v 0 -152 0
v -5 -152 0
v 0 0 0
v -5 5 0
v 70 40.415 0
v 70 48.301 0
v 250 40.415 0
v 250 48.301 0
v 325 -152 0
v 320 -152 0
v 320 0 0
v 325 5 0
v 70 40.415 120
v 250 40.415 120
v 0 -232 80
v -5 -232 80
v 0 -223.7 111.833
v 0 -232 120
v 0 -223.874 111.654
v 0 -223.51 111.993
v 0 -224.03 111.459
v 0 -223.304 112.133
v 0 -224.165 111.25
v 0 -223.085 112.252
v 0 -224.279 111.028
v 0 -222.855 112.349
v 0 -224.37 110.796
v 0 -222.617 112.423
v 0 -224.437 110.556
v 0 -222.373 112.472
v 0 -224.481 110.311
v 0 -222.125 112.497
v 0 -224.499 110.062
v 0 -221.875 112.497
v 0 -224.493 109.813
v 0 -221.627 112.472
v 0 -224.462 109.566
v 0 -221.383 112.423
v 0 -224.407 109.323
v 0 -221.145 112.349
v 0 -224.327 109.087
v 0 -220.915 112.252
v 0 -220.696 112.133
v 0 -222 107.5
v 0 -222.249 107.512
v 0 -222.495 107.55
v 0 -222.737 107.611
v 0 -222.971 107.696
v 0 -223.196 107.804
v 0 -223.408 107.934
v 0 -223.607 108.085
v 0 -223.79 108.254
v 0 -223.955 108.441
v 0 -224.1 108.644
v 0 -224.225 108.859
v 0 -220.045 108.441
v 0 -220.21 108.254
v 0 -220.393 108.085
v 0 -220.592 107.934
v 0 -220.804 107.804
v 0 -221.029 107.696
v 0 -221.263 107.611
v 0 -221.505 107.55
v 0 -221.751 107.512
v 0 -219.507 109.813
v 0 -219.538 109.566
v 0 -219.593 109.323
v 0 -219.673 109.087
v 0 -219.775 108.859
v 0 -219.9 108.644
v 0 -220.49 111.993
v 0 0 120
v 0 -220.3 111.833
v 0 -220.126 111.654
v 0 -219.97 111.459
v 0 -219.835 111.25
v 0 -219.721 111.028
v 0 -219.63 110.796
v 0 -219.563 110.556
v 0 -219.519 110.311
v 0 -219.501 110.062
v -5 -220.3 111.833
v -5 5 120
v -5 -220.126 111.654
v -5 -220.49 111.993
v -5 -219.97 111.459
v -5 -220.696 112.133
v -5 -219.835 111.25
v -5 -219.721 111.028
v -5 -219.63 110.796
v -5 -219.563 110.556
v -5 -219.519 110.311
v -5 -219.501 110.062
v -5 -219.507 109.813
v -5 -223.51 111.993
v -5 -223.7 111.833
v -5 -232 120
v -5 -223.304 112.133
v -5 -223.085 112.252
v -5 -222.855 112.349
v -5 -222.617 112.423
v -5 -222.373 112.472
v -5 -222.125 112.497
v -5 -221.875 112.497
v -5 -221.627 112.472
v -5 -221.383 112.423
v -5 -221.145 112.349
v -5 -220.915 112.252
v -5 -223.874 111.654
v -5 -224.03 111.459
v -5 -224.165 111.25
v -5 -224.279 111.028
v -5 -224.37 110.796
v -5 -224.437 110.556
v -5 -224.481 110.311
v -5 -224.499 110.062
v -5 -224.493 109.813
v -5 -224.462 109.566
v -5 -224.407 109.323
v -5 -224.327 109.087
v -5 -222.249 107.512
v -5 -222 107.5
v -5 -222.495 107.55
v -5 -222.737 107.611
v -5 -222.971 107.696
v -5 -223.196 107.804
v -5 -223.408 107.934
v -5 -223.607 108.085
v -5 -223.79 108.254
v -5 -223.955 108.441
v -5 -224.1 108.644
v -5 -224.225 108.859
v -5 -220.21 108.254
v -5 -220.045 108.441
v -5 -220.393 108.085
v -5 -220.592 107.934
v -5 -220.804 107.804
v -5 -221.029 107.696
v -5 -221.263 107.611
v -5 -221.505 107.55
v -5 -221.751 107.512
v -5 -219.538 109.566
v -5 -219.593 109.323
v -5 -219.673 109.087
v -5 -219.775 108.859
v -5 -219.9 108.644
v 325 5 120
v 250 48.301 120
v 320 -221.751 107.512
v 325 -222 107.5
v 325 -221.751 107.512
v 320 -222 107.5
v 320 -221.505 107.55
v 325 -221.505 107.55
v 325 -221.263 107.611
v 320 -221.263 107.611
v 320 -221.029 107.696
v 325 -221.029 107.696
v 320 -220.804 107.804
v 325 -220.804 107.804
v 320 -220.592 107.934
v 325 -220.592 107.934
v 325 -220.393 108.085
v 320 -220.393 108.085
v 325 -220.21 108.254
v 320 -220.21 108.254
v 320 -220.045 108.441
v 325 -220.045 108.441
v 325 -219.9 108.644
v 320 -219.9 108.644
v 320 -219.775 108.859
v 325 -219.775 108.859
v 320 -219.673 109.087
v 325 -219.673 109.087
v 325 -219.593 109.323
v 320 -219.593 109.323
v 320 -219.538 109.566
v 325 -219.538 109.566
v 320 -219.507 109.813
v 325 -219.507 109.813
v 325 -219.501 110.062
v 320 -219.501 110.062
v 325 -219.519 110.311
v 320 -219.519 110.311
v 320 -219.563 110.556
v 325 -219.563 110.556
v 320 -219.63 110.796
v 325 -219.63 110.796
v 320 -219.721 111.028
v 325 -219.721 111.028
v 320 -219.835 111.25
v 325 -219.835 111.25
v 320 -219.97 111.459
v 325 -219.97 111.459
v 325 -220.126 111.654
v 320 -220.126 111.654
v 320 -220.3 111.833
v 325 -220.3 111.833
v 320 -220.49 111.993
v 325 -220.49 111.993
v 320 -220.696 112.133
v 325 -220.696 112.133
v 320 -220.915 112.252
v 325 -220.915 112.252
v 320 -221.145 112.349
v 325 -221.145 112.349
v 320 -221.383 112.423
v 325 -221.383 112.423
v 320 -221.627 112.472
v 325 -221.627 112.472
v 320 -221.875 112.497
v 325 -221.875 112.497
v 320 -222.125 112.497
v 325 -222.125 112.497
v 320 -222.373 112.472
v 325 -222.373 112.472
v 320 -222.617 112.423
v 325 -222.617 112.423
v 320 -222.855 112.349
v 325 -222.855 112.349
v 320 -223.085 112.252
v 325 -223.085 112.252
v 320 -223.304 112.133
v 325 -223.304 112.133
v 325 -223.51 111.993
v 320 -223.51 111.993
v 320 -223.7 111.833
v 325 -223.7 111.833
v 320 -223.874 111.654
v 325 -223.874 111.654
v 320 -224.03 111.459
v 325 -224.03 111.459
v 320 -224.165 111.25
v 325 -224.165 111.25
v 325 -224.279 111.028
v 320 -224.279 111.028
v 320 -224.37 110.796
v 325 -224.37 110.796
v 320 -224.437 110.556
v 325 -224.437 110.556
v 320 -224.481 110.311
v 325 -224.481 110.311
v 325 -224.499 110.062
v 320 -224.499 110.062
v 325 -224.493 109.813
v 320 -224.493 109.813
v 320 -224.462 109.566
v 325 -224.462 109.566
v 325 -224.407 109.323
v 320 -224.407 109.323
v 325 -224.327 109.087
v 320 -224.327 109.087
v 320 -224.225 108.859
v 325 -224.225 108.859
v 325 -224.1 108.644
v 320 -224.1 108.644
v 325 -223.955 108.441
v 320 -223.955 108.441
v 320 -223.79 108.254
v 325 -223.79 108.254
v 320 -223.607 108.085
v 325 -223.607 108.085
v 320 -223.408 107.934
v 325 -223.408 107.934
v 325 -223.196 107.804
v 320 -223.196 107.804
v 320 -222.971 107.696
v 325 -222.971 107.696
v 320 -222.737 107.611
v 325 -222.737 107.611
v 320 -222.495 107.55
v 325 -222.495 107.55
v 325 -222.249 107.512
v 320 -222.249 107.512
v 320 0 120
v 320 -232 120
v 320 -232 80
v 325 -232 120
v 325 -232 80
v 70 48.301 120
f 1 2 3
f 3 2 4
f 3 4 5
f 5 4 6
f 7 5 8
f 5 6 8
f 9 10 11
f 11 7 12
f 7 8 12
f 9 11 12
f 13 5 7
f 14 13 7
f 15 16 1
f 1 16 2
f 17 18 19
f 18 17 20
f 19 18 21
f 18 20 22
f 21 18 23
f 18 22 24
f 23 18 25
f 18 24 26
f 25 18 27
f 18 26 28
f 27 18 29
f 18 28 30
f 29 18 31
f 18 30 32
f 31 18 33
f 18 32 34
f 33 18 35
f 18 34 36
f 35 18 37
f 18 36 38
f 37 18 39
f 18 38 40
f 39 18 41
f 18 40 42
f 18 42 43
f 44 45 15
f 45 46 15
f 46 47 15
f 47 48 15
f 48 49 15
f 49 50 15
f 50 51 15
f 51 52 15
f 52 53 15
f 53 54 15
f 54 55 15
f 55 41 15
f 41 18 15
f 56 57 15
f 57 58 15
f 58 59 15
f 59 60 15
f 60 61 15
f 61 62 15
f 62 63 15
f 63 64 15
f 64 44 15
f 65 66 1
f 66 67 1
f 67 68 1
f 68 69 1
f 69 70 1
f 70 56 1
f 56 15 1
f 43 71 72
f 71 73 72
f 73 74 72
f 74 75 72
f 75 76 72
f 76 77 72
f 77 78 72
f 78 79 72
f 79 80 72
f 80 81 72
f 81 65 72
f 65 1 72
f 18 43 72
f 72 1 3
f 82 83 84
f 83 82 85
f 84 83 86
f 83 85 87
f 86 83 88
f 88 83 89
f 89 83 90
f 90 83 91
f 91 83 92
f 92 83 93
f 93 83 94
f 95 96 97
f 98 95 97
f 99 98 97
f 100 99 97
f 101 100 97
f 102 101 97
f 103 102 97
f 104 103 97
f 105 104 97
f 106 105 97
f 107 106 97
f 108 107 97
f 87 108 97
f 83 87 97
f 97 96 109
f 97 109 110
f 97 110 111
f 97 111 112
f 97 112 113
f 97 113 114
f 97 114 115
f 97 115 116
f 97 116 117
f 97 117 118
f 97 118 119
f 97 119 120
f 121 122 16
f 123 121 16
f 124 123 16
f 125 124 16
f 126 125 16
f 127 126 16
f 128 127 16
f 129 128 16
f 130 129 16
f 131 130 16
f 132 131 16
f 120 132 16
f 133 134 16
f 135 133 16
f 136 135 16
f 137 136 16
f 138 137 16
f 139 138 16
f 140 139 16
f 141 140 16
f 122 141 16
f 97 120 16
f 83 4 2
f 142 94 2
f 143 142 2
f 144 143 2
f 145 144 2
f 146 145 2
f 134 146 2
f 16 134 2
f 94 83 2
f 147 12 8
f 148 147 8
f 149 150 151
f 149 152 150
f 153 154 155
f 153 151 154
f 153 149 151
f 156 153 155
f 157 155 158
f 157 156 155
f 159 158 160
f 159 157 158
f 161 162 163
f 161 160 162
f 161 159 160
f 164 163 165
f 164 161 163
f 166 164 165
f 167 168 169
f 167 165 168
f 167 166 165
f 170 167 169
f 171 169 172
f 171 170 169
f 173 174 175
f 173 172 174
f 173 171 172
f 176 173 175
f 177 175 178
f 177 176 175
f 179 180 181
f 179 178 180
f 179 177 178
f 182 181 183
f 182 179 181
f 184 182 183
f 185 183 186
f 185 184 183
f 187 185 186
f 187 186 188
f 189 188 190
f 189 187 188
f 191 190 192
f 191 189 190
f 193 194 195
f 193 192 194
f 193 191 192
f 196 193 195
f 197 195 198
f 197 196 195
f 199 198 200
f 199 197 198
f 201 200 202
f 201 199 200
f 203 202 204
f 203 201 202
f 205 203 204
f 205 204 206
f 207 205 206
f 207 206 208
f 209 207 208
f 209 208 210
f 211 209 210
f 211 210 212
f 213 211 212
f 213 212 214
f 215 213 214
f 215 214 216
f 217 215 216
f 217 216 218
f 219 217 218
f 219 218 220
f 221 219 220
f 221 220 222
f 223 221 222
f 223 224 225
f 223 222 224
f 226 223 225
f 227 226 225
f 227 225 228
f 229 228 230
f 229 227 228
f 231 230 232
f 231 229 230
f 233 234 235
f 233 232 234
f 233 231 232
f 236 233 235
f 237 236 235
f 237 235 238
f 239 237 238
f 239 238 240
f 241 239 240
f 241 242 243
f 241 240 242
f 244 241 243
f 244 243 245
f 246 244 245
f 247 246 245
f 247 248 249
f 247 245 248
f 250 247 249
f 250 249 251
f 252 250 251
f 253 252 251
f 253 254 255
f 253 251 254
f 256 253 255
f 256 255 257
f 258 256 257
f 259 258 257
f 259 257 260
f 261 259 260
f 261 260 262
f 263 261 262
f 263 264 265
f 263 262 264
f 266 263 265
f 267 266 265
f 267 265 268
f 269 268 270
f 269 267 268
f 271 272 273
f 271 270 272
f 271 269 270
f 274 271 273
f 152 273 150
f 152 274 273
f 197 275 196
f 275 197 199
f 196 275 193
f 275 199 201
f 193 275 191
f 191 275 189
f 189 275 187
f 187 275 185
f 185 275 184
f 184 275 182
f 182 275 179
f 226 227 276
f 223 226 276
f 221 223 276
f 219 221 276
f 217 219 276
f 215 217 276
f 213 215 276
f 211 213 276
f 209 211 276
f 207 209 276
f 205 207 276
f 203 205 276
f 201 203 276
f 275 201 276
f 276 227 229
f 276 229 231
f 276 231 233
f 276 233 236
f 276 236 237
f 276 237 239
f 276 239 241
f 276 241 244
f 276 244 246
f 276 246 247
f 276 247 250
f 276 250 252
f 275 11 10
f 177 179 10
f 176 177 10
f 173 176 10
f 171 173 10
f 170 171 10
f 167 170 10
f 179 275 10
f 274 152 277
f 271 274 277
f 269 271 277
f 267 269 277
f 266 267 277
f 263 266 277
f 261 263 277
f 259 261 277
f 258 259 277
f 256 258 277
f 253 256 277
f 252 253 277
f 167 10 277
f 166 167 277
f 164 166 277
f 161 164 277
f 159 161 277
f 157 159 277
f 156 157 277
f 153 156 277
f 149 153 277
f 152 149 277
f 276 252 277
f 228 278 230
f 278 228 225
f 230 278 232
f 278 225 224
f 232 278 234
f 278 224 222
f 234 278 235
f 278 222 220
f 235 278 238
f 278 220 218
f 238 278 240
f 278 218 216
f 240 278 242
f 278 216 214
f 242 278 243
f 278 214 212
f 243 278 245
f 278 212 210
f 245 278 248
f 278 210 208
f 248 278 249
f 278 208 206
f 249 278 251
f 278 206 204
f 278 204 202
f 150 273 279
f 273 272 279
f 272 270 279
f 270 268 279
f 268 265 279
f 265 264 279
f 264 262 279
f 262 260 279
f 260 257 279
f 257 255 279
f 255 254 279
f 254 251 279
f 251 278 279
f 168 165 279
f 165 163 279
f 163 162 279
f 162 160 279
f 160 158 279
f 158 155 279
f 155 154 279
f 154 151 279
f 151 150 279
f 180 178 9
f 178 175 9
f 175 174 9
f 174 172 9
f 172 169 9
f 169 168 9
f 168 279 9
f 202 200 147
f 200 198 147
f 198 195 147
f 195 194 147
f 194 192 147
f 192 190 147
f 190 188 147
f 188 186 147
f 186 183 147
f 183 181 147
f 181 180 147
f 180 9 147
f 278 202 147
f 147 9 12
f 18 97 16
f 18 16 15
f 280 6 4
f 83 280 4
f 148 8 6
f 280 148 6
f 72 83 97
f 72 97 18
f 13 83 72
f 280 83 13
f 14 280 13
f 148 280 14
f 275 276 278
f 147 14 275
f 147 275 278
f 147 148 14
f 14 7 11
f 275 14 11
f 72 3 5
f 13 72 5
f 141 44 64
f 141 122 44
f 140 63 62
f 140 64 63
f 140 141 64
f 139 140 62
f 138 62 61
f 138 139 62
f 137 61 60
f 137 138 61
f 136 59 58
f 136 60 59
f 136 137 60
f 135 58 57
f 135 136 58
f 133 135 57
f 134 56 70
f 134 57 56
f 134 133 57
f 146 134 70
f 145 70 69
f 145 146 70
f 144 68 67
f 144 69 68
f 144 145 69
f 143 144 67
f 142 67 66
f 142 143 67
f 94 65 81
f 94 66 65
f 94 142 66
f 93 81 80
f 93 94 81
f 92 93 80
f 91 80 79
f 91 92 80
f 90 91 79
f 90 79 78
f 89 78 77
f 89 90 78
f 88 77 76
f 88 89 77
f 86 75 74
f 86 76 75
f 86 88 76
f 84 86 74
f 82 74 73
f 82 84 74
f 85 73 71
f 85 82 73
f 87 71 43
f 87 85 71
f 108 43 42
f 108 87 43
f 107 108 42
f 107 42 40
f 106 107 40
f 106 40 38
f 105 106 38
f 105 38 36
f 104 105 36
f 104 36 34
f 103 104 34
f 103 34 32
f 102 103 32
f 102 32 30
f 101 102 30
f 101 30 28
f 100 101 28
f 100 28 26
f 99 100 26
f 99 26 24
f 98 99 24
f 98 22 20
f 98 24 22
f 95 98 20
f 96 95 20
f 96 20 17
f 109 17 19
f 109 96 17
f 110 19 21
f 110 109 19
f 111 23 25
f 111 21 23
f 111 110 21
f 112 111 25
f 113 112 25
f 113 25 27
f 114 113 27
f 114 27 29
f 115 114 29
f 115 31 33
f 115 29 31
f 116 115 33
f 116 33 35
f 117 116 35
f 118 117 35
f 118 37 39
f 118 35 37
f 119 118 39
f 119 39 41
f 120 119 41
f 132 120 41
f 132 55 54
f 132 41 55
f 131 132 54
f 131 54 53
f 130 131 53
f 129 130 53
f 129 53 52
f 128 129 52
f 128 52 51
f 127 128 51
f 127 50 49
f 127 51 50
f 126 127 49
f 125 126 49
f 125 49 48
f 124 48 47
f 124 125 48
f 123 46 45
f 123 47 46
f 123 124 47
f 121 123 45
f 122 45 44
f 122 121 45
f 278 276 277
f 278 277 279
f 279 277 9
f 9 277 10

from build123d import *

# Parameters (mm, degrees)
BOSS_EXTRUDE2_DEPTH     = 120
CUT_EXTRUDE2_DEPTH      = 421.861022191
CUT_EXTRUDE2_DEPTH_BACK = 421.861022191
SKETCH5_R               = 2.5


with BuildPart() as part:
    # Sketch3 → Boss-Extrude2 (new body)
    with BuildSketch(Plane.XY):
        Polygon((-5, 5), (-5, -232), (0, -232), (0, 0), (70, 40.414518843), (250, 40.414518843), (320, 0), (320, -232), (325, -232), (325, 5), (250, 48.301270189), (70, 48.301270189), align=None)
    extrude(amount=BOSS_EXTRUDE2_DEPTH)

    # Sketch5 → Cut-Extrude2 (cut, two sides: drawn at the far end of the back side and taken through both)
    with BuildSketch(Plane(origin=(325, 0, 0), x_dir=(0, 0, -1), z_dir=(1, 0, 0)).offset(-CUT_EXTRUDE2_DEPTH_BACK)):
        with Locations((-110, -222)):
            Circle(SKETCH5_R)
        Polygon((-80, -232), (0, -152), (0, -232), align=None)
    extrude(amount=CUT_EXTRUDE2_DEPTH + CUT_EXTRUDE2_DEPTH_BACK, mode=Mode.SUBTRACT)


solid = part.part
